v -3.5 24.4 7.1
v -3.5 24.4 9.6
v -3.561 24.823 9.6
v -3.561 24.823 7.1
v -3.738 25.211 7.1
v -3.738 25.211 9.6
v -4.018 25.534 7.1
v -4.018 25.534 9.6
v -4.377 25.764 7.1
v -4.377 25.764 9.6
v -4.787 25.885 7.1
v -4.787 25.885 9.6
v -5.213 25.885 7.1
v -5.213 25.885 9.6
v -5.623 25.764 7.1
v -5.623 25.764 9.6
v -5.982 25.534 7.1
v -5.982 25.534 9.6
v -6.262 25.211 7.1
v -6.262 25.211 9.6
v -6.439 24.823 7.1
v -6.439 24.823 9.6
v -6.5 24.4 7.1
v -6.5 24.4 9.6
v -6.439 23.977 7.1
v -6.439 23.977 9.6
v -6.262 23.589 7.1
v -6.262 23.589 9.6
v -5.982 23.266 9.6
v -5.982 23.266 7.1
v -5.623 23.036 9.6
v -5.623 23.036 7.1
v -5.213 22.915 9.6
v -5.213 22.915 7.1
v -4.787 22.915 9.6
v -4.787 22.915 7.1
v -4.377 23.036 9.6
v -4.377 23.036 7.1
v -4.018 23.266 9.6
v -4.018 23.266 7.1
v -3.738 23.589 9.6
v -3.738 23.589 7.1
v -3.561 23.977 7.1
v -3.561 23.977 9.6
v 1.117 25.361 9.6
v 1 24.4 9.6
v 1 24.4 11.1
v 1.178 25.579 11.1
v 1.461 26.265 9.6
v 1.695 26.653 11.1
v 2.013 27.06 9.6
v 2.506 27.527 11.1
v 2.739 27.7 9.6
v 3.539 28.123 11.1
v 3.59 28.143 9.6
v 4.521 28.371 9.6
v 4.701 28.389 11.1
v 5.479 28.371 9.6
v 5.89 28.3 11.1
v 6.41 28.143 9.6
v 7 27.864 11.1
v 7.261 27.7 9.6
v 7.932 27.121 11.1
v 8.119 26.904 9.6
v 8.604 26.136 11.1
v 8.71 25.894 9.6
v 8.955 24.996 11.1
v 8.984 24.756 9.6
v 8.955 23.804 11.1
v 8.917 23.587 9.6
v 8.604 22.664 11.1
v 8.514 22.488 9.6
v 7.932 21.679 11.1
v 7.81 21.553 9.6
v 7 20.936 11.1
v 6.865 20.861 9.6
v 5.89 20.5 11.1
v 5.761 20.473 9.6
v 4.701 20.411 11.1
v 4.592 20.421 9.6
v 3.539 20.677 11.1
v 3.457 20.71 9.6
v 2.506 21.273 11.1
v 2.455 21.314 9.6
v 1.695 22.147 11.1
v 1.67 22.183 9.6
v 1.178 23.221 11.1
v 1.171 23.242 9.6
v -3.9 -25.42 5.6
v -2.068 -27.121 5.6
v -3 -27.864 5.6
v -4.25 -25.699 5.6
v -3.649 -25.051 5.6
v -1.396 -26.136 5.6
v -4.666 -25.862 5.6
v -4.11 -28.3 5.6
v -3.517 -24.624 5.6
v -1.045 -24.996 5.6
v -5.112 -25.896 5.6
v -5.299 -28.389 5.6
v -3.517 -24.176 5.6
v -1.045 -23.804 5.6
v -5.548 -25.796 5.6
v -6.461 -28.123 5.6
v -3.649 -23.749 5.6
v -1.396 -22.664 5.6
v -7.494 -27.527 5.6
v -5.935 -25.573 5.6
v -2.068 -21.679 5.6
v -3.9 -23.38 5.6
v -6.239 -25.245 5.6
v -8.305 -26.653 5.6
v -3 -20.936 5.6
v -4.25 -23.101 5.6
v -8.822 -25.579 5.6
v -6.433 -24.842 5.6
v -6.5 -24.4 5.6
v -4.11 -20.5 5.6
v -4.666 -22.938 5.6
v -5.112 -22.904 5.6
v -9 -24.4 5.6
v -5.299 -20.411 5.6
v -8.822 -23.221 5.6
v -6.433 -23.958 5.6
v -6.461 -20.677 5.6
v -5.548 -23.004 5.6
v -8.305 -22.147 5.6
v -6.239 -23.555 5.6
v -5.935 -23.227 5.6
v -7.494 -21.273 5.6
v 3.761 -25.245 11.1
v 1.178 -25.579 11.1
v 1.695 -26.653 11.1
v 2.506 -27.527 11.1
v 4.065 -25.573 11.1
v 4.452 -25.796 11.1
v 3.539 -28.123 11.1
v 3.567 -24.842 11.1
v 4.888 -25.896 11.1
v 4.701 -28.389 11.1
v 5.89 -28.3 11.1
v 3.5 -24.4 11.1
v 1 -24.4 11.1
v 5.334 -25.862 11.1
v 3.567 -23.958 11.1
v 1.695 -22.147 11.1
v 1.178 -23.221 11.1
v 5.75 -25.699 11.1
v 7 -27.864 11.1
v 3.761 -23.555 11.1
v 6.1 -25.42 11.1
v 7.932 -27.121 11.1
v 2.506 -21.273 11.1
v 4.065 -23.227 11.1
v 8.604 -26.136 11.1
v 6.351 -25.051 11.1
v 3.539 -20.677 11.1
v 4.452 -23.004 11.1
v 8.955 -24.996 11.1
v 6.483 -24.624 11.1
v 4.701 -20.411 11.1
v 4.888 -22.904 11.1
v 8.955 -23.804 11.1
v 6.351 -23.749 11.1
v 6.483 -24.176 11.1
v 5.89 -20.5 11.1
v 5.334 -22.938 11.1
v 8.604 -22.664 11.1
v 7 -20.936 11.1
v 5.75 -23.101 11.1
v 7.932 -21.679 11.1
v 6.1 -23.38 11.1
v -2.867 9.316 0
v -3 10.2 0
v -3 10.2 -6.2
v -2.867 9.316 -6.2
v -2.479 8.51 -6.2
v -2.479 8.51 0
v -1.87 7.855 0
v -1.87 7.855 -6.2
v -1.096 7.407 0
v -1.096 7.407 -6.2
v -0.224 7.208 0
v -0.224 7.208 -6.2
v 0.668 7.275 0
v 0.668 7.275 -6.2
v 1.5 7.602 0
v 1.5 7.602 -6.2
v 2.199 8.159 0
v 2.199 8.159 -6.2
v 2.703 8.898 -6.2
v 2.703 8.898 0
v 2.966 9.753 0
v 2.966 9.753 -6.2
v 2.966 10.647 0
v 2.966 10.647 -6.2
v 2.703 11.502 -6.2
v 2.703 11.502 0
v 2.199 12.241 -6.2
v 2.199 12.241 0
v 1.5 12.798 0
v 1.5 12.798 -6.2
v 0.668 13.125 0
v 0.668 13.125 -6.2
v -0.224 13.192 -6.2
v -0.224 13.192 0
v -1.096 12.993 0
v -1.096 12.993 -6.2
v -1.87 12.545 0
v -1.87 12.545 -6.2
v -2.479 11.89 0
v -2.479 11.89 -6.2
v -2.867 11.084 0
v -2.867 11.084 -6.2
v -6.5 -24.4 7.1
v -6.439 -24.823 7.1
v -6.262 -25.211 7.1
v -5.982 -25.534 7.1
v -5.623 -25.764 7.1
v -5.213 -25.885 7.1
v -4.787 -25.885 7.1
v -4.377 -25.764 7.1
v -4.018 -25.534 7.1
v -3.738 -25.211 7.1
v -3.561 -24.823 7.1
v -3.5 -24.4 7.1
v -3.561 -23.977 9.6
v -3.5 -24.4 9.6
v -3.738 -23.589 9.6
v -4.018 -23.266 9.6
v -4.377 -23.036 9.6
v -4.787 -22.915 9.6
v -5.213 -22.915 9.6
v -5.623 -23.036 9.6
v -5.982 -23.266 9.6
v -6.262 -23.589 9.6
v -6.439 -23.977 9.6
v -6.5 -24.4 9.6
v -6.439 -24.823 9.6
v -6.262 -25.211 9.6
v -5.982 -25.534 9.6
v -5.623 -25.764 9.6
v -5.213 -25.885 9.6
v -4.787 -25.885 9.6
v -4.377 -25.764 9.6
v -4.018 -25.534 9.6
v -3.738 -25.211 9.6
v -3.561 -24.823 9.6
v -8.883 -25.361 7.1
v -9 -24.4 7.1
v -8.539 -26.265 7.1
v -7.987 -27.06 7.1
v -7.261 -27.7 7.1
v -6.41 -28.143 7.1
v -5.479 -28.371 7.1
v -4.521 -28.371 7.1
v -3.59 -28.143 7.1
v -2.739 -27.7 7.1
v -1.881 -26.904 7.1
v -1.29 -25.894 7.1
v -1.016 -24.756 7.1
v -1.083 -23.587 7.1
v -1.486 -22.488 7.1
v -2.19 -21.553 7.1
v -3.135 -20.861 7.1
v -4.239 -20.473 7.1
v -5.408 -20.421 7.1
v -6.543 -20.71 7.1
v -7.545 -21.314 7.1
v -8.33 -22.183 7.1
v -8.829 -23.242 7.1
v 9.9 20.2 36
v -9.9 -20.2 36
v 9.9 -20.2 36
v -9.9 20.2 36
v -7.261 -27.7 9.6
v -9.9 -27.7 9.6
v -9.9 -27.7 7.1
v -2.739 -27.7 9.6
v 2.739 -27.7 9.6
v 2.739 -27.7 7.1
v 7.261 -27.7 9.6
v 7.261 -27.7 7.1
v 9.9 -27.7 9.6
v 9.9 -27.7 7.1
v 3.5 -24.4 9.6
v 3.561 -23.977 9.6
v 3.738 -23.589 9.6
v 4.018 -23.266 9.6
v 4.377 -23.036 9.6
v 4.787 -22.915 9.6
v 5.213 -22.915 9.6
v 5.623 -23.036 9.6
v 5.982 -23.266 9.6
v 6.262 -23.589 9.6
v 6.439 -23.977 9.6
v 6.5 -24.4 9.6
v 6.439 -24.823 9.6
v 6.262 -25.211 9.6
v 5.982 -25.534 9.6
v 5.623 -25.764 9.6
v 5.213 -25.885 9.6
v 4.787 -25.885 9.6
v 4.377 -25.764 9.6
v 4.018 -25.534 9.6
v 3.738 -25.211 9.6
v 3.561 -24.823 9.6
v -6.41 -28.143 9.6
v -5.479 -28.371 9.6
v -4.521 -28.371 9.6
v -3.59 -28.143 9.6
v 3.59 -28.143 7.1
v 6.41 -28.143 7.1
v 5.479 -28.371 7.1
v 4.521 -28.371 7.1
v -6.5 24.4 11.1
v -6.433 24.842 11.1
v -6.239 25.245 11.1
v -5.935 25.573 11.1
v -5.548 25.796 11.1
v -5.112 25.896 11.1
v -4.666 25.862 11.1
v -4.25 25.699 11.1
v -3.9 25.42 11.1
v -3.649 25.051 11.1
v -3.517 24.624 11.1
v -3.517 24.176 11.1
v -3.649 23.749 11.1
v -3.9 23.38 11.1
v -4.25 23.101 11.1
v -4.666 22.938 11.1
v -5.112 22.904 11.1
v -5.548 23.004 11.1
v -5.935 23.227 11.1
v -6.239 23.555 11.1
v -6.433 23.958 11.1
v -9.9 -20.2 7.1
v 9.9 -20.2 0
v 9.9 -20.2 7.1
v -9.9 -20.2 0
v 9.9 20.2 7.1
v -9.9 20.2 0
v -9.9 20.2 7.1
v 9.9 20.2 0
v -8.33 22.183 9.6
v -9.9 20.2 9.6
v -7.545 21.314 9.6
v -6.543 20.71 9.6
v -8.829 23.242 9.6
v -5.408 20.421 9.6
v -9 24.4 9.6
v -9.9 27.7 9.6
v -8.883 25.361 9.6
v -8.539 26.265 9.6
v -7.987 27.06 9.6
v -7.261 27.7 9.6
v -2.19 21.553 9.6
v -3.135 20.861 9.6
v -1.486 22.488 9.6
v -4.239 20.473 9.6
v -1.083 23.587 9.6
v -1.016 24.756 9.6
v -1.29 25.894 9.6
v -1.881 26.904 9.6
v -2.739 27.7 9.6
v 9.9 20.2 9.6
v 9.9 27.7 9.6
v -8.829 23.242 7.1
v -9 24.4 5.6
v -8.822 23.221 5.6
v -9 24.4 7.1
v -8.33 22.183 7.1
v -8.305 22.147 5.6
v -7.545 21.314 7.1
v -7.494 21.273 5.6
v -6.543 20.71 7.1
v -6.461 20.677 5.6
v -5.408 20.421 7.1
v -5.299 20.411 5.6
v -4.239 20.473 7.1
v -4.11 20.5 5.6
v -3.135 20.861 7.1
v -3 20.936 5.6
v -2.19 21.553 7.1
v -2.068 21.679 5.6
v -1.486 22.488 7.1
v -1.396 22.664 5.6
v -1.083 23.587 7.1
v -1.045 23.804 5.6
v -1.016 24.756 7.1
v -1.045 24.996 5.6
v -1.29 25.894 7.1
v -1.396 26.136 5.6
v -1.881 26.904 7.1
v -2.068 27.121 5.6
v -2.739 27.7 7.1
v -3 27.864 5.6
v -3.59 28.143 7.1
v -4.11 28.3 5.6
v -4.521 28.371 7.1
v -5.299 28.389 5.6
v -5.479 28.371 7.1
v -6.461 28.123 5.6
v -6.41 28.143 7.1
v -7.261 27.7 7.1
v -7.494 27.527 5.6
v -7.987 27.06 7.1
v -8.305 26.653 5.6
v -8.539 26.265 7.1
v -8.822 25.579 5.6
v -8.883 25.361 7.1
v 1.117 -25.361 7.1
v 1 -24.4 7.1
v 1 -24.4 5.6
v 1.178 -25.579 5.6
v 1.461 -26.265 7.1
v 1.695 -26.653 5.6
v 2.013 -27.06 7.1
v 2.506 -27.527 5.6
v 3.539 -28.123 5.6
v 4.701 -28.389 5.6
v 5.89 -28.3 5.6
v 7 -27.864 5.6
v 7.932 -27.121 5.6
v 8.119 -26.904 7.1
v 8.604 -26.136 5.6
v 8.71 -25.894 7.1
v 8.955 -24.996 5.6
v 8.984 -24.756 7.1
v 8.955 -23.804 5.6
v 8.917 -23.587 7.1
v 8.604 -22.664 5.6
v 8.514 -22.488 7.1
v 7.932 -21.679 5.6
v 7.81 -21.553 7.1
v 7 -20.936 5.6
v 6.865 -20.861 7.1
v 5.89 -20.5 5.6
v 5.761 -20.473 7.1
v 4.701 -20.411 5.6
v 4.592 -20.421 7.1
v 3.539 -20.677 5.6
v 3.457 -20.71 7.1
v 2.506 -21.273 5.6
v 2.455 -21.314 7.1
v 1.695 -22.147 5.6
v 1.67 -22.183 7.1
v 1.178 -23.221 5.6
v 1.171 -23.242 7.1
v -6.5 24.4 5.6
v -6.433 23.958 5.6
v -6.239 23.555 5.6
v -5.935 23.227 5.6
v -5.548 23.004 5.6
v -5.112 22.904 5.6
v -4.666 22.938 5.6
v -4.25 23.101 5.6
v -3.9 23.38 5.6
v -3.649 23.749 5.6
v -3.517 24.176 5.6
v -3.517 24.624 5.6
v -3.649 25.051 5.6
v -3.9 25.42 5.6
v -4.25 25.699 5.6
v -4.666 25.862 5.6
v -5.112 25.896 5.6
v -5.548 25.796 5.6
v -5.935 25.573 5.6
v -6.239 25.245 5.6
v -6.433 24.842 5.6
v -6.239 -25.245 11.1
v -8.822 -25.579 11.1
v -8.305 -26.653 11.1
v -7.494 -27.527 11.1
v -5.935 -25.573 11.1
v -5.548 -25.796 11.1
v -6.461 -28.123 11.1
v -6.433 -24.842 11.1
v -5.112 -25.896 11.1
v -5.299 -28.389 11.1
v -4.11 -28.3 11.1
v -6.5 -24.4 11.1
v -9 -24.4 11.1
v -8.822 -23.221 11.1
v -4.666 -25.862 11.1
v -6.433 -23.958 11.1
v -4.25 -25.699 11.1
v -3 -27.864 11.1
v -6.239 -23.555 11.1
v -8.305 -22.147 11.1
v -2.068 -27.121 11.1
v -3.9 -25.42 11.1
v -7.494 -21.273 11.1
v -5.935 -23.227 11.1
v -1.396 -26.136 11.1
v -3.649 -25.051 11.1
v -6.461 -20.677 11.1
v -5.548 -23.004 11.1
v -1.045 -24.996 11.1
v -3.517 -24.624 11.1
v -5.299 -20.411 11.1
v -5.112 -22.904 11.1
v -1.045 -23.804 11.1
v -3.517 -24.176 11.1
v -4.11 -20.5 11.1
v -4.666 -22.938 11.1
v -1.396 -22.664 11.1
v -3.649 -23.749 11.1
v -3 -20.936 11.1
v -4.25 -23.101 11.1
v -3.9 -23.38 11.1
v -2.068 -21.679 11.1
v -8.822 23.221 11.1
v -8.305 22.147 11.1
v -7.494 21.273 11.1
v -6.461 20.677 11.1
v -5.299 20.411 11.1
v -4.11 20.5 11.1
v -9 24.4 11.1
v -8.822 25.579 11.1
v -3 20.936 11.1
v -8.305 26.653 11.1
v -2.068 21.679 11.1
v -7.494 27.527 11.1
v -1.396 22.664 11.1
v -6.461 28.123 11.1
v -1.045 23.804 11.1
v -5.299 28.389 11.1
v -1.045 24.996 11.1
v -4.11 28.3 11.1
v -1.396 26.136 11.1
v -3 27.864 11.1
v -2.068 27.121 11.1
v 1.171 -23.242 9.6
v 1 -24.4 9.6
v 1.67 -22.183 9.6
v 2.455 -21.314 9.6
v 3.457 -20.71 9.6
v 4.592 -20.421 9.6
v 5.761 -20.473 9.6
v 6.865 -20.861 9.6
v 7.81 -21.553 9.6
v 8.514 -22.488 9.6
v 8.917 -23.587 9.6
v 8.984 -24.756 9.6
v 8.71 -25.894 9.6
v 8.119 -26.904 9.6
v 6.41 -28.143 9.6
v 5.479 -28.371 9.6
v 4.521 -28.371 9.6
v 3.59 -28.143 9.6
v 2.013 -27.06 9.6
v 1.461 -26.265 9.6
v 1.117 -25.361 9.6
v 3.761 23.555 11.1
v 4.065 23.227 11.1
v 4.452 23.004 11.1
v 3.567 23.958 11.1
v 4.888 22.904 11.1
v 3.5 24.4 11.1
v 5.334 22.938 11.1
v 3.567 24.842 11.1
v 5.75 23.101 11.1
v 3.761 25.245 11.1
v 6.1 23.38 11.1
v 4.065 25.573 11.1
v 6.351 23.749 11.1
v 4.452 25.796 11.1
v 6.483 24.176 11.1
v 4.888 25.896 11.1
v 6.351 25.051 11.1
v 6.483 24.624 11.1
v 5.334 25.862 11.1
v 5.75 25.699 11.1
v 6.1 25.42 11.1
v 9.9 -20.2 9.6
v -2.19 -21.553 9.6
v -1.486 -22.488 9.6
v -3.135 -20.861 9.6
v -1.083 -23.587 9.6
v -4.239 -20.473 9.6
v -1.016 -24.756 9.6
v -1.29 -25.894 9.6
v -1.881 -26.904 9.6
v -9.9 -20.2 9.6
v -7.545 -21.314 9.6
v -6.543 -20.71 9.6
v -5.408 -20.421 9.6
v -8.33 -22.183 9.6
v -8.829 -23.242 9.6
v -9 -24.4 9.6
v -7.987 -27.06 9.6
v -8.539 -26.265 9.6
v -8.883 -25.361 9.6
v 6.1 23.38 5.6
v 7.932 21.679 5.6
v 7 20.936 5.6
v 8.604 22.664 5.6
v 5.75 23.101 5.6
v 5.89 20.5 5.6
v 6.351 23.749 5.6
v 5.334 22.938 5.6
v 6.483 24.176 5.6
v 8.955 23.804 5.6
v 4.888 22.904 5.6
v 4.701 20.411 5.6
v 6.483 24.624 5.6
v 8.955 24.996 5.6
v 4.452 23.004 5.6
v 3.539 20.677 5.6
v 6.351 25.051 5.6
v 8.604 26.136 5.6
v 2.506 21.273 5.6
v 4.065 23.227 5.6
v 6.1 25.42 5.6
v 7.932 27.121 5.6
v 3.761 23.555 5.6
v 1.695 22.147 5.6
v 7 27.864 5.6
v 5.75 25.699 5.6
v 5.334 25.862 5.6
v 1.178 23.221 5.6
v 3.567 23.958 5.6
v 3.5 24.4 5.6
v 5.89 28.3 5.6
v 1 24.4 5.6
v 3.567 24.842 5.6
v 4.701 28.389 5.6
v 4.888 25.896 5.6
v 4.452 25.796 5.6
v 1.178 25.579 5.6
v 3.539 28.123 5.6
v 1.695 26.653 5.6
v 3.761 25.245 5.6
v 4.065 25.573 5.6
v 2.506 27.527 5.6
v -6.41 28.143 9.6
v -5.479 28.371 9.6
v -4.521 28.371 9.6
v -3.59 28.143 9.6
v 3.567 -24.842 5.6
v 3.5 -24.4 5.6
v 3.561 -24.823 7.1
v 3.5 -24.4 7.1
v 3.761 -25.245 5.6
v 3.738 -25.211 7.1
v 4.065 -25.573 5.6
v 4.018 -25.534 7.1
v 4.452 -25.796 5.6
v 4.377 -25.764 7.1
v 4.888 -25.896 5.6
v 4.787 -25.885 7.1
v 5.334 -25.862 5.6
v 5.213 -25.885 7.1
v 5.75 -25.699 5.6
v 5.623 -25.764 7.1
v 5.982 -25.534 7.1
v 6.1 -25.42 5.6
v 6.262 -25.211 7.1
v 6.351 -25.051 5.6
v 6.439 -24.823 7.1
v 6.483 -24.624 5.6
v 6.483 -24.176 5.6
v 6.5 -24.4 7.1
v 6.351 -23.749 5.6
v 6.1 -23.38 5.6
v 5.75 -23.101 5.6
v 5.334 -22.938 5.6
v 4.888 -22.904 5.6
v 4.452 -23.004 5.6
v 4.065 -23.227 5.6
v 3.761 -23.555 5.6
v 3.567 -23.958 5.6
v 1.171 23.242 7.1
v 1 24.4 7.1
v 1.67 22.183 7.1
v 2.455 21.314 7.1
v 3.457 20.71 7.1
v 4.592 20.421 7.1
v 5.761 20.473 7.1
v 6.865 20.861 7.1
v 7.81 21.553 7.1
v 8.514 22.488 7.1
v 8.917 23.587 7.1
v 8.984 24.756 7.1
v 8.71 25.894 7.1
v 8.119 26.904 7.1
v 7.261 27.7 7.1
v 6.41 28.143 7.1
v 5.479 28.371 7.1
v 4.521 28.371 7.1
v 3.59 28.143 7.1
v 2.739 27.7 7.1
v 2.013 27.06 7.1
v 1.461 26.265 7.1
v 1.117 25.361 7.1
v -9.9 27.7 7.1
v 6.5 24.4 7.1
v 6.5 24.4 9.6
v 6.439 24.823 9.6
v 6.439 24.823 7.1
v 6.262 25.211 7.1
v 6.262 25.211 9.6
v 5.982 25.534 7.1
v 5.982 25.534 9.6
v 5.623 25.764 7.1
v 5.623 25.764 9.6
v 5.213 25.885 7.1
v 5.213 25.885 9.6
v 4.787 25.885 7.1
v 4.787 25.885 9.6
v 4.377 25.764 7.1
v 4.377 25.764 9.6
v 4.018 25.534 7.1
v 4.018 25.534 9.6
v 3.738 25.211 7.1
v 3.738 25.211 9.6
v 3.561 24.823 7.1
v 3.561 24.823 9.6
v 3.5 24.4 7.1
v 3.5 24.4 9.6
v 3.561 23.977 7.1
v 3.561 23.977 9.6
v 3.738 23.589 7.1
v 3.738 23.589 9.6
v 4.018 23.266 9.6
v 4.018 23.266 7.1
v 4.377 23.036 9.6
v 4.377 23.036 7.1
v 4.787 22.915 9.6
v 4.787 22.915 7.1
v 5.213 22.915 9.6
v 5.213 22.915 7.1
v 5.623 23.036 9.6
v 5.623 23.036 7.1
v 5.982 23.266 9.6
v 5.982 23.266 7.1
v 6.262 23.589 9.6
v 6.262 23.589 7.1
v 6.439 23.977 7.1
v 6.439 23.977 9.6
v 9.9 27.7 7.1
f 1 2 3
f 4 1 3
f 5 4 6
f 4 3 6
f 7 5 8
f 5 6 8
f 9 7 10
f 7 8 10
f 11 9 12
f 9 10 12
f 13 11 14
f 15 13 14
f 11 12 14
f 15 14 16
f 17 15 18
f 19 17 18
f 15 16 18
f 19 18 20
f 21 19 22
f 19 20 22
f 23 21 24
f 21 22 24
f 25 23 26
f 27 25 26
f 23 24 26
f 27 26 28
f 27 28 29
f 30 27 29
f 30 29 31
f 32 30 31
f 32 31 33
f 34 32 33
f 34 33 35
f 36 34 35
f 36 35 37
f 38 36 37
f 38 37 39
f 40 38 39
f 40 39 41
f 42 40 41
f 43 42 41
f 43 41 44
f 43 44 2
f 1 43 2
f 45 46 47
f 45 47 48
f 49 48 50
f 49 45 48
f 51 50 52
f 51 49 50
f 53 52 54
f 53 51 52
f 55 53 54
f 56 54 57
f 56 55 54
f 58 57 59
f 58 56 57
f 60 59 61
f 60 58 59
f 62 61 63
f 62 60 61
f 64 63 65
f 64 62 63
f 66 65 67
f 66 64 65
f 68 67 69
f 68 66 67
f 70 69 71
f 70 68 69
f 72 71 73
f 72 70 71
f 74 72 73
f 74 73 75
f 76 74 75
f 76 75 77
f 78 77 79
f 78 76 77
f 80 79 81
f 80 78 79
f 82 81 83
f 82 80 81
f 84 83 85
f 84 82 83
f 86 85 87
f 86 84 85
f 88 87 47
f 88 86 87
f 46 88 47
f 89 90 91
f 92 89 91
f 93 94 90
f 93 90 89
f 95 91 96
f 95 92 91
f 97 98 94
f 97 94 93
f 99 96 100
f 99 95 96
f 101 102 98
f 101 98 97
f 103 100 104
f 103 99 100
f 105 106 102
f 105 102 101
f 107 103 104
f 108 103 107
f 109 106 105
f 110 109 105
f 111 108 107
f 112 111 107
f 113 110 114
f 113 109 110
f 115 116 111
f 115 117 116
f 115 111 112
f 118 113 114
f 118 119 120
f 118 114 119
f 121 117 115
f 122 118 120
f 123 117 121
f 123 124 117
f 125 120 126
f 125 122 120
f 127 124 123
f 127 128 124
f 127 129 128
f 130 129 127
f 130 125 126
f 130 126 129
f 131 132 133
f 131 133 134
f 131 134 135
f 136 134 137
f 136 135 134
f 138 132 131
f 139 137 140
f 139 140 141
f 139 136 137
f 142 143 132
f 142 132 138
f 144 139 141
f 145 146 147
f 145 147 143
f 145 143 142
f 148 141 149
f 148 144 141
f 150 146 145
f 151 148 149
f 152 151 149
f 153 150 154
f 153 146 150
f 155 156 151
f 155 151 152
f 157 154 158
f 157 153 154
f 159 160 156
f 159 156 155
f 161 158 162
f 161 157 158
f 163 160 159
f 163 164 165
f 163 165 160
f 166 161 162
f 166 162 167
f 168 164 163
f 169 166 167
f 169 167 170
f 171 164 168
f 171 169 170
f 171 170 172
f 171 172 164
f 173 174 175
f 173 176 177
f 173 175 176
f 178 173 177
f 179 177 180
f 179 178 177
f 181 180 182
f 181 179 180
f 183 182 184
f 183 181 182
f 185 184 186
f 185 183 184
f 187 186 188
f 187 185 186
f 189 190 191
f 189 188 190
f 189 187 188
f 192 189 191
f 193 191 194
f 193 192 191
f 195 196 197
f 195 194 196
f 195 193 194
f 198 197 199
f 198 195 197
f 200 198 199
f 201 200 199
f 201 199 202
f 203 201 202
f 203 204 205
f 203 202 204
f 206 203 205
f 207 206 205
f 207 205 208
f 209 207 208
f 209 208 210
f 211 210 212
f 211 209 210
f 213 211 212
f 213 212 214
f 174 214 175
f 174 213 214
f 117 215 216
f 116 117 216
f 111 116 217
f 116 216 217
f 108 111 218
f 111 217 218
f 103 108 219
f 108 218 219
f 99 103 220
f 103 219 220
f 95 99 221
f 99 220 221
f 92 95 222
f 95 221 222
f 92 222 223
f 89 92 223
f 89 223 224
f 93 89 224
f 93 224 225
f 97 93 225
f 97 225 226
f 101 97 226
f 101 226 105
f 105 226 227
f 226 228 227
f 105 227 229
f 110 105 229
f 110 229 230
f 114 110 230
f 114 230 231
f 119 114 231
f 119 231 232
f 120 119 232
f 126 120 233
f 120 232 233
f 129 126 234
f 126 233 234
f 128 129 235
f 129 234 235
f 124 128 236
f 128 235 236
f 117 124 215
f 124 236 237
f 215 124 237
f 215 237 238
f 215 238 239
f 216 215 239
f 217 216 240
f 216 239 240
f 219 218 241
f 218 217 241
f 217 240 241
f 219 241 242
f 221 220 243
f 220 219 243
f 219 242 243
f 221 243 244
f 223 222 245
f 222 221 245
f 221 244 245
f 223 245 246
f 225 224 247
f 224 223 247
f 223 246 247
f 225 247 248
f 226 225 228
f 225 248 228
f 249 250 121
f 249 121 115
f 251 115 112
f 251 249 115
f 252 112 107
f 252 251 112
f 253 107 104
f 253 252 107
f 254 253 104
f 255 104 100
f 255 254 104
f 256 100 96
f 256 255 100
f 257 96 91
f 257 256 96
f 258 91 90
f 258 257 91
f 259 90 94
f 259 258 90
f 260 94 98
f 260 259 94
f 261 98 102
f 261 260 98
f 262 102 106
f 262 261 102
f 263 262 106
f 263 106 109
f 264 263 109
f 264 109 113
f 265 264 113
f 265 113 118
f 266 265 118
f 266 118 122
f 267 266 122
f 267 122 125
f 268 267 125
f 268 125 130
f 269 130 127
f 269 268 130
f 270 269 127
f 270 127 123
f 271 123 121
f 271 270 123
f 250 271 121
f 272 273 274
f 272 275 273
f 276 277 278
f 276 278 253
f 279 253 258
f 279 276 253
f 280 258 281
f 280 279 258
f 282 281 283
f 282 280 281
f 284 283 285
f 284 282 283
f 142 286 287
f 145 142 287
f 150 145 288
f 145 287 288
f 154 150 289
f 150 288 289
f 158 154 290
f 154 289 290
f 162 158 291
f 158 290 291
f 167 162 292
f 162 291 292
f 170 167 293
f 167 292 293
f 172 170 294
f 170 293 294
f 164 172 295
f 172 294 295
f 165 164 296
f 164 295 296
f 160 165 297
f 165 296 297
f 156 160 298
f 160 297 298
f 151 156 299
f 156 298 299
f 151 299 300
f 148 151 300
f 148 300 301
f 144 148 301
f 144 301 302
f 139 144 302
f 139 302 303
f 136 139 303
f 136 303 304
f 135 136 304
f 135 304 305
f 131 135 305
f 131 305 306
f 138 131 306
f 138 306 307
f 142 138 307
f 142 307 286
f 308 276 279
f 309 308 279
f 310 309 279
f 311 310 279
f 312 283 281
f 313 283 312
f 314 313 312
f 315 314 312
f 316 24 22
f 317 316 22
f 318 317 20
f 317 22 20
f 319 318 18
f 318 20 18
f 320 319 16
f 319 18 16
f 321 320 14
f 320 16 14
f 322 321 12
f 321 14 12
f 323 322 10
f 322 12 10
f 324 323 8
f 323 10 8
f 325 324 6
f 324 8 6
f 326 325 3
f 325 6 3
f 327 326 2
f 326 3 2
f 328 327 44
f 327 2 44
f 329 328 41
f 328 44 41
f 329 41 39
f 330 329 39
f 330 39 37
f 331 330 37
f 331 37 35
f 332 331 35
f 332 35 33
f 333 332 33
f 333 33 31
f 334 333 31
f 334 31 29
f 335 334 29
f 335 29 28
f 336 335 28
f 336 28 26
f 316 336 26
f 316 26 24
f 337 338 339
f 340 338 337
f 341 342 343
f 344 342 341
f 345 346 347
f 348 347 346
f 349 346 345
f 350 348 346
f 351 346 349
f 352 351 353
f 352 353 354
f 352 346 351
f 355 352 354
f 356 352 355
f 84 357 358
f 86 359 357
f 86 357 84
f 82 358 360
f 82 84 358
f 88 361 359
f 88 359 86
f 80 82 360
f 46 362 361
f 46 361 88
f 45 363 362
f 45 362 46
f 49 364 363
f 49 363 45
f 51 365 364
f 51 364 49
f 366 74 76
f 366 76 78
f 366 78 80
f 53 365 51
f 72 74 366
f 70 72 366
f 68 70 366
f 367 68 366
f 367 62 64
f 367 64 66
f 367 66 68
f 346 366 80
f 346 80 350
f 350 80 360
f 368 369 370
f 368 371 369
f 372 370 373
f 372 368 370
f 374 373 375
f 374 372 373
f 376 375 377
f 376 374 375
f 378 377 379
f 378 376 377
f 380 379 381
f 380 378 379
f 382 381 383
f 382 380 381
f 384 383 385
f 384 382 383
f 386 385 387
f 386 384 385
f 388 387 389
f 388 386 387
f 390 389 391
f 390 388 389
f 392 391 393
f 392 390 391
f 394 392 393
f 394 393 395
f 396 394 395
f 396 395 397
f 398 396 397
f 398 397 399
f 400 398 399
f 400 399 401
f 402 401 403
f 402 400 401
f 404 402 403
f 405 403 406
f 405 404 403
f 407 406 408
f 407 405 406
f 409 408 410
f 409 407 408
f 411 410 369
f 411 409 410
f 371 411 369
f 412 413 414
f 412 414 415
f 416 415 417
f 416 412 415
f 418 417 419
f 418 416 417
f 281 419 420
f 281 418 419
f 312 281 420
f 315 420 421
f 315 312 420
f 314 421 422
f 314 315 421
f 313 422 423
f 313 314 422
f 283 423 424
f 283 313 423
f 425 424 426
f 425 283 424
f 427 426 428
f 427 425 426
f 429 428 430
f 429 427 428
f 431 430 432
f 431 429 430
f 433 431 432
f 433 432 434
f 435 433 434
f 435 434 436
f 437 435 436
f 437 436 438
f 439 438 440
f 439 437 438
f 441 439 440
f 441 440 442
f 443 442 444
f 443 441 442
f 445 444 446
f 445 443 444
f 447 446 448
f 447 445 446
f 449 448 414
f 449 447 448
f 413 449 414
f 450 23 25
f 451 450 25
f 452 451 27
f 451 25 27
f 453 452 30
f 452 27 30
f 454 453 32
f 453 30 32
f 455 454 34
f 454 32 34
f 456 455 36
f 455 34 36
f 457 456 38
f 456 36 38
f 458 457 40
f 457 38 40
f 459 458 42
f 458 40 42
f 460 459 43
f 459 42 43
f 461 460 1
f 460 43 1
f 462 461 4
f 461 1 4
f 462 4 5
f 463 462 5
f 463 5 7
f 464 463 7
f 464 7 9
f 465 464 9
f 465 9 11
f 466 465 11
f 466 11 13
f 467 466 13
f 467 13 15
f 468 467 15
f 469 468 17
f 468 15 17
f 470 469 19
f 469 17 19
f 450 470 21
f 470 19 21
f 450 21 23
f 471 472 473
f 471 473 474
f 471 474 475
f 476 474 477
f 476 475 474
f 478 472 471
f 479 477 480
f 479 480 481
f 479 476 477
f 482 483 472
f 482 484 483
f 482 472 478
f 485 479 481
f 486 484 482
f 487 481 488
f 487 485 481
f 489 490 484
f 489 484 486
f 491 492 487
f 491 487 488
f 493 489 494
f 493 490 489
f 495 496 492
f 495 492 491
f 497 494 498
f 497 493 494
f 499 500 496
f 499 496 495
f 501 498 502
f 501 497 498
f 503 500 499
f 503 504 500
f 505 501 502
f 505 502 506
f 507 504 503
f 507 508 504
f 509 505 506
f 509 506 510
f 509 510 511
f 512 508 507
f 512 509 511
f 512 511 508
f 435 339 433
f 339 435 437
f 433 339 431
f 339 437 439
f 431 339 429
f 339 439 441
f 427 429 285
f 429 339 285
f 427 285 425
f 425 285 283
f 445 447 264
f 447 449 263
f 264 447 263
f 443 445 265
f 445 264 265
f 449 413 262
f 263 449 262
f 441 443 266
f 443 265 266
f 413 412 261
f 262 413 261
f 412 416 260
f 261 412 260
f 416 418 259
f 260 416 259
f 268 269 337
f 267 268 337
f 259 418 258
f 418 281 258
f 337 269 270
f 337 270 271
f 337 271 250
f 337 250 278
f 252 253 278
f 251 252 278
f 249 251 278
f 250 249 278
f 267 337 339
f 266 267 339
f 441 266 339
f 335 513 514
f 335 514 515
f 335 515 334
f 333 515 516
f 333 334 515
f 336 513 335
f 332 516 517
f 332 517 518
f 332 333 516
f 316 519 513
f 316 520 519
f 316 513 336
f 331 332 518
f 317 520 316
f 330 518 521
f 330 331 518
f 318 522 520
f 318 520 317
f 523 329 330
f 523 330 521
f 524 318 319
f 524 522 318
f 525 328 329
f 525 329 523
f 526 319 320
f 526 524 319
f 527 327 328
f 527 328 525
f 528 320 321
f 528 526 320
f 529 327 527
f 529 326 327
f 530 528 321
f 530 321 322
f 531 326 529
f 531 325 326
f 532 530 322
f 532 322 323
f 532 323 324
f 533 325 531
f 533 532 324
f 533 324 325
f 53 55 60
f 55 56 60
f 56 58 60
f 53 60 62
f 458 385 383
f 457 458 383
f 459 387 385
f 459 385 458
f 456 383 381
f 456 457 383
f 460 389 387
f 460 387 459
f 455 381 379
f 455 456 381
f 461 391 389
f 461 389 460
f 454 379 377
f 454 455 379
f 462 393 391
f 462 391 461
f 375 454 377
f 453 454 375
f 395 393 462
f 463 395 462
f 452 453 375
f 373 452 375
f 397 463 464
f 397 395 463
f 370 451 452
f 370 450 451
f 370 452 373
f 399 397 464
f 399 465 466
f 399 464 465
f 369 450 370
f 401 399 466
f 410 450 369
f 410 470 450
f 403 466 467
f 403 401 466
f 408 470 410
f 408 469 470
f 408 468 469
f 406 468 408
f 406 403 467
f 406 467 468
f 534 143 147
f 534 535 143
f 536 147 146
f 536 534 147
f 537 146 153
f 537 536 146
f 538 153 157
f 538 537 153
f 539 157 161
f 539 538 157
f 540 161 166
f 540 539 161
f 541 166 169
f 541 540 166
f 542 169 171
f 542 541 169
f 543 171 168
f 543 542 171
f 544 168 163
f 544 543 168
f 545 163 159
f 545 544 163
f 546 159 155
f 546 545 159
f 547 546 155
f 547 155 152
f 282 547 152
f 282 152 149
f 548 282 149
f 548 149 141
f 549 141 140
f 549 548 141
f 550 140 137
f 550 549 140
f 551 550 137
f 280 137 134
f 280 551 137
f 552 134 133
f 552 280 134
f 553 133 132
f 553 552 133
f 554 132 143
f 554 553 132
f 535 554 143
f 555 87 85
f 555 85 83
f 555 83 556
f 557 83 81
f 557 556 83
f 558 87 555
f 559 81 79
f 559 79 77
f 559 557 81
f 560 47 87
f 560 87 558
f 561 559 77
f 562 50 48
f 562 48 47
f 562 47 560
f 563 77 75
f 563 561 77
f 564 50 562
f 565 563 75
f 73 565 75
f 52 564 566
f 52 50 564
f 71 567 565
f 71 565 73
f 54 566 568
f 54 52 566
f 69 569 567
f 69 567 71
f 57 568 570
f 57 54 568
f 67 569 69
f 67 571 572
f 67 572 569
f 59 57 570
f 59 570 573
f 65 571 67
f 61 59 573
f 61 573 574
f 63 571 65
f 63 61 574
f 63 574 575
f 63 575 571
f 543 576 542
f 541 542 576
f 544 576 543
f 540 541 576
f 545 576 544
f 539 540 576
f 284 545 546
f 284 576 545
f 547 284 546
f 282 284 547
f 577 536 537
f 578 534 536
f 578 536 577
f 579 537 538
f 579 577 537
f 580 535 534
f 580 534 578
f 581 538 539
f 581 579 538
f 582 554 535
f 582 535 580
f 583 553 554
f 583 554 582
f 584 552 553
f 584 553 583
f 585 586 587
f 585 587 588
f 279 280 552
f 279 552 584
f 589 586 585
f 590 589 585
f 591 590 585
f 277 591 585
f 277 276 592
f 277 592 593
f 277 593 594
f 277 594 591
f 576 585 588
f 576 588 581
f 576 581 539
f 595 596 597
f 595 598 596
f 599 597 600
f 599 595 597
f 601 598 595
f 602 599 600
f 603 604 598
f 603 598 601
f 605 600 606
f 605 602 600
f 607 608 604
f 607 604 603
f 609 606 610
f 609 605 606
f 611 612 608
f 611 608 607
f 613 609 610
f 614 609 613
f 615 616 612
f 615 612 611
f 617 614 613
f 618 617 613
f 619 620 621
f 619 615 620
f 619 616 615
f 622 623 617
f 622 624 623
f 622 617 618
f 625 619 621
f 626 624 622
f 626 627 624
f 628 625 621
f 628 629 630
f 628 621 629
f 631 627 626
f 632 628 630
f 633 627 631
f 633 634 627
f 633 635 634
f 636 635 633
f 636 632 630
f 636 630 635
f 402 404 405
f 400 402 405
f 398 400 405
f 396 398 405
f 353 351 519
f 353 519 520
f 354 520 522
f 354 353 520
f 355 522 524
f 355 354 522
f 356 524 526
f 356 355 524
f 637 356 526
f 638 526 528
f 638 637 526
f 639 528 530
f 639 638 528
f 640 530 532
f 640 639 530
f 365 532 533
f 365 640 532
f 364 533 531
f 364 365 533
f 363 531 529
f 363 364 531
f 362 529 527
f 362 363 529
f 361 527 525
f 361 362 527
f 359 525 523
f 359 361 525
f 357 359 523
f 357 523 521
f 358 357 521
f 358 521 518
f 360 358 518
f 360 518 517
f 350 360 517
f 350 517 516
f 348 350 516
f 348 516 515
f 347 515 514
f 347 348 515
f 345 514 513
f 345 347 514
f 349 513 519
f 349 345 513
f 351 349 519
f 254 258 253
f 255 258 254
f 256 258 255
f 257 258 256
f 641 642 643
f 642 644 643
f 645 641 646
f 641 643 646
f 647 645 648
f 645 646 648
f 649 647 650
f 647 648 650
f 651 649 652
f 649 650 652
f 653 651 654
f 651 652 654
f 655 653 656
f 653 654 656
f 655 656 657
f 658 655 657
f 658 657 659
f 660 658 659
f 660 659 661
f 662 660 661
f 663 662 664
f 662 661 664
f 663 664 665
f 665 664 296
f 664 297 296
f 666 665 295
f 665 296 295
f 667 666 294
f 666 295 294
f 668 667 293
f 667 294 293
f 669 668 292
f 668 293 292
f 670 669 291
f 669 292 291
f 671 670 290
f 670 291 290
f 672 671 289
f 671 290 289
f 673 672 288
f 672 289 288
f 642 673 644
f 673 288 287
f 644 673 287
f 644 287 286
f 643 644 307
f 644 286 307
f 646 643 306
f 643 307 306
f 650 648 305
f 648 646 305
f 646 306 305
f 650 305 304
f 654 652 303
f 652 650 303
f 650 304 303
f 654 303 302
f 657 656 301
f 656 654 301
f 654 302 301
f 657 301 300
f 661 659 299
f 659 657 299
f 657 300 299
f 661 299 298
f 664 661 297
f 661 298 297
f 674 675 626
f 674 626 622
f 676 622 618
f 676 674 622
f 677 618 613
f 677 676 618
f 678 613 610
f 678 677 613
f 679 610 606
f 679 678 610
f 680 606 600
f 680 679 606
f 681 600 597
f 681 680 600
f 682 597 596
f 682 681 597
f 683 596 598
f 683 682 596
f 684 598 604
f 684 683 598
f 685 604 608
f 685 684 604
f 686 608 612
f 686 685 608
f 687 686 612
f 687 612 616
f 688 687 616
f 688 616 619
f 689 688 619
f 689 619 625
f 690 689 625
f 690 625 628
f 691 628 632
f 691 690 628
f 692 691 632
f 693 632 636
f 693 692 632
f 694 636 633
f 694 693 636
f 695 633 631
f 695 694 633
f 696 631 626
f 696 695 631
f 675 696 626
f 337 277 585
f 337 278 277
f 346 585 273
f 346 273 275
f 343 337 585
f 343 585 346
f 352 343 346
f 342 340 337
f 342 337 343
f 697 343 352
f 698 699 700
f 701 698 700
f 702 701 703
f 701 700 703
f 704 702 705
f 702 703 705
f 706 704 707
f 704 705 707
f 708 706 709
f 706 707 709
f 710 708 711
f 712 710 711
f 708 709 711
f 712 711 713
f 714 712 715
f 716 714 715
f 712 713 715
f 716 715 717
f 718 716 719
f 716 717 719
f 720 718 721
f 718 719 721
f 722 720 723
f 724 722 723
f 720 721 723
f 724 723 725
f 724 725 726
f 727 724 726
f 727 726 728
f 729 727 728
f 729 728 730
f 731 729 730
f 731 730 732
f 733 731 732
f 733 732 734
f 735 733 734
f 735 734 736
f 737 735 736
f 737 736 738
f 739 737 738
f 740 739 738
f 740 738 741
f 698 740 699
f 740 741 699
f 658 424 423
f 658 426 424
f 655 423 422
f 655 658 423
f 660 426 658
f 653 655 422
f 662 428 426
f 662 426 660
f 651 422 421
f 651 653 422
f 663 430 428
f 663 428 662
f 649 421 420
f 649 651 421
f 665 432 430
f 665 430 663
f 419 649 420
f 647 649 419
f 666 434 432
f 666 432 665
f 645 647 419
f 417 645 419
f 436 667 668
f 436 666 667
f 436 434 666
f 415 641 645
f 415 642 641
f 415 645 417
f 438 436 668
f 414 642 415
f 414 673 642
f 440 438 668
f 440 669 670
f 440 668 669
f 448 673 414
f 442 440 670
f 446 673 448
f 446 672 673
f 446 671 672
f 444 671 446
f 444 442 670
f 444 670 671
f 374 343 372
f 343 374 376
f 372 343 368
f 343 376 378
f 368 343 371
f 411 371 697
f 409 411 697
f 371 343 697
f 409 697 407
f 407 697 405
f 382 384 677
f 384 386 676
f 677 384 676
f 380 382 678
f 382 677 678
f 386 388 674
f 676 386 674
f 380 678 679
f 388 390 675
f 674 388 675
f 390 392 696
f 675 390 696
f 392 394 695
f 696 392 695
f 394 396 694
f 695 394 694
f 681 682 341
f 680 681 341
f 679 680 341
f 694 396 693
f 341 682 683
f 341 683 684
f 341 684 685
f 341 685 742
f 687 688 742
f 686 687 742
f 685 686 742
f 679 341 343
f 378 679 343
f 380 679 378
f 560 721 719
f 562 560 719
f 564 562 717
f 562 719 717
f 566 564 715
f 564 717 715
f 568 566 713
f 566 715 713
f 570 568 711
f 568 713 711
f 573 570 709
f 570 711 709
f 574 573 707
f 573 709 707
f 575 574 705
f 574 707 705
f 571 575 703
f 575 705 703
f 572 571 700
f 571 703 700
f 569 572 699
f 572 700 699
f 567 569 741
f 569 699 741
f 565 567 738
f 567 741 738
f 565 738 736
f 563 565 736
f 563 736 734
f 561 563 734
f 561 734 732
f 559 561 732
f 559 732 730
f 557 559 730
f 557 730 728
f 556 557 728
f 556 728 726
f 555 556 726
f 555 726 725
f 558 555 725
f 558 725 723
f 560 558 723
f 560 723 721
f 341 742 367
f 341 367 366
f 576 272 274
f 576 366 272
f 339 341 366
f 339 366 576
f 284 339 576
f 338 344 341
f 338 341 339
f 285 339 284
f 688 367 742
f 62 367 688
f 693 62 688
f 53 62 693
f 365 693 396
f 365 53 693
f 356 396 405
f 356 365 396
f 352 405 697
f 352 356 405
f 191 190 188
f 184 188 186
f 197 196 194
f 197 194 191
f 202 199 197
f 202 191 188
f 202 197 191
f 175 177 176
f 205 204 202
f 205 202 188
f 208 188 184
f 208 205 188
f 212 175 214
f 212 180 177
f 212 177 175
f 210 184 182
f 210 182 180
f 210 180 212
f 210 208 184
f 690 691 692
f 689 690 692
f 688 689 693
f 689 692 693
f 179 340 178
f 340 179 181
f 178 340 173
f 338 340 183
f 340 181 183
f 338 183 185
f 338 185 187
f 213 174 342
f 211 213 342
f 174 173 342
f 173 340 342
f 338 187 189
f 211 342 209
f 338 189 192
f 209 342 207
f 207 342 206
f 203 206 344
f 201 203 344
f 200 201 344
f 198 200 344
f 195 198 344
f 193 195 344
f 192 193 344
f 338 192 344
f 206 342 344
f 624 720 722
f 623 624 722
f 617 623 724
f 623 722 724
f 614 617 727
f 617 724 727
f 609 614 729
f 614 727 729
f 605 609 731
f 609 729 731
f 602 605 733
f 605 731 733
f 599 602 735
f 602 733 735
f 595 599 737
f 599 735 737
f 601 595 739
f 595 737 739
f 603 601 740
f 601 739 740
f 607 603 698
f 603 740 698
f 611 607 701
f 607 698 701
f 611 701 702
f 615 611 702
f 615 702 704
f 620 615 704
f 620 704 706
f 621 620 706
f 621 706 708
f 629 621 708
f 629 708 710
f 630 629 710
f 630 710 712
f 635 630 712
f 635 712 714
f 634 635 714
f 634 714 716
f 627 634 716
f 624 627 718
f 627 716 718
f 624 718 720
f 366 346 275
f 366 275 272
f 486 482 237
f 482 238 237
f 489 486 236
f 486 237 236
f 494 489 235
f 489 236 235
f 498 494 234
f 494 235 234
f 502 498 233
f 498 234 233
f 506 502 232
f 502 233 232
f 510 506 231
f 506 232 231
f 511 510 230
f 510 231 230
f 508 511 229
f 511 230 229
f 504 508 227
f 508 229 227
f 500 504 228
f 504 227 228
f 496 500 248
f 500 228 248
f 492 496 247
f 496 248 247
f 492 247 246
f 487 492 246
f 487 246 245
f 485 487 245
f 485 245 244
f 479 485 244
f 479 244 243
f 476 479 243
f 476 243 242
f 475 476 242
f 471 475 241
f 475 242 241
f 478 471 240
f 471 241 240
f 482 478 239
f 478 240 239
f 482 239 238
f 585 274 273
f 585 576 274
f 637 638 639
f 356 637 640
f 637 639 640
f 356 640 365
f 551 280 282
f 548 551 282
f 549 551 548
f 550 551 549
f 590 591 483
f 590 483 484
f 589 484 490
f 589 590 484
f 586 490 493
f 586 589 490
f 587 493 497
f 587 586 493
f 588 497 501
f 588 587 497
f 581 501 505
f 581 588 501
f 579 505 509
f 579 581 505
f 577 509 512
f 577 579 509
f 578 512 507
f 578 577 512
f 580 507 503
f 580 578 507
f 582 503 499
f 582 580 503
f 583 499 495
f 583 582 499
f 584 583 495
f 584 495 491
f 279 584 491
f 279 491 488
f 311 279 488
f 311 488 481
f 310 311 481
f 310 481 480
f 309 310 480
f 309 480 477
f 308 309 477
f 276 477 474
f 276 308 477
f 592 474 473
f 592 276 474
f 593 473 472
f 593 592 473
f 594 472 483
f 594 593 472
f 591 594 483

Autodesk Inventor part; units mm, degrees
sketch "スケッチ1" plane through (0, 0, 0) normal (0, 0, 1) x (1, 0, 0)
  line L0 (9.9, -20.2) -> (-9.9, -20.2)
  line L1 (-9.9, -20.2) -> (-9.9, 20.2)
  line L2 (-9.9, 20.2) -> (9.9, 20.2)
  line L3 (9.9, 20.2) -> (9.9, -20.2)
  line L4 (9.9, -20.2) -> (-9.9, 20.2) construction
  line L5 (-9.9, -20.2) -> (9.9, 20.2) construction
  circle A0 centre (-10.932, 25.3443) radius 2.25
  point P0 (0, 0)
  dimension "d0" = 4.5
  dimension "d1" = 40.4
  dimension "d2" = 19.8
extrude "押し出し1" add sketch "スケッチ1" along normal blind 36 contours L0 L1 L2 L3
sketch "スケッチ2" plane through (0, 0, 0) normal (0, 0, -1) x (-1, 0, 0)
  circle A0 centre (0, 10.2) radius 3
  line L0 (9.9, 20.2) -> (-9.9, 20.2) projected
  point P0 (0, 0)
  dimension "d5" = 6
  dimension "d6" = 10
extrude "押し出し2" add sketch "スケッチ2" along normal blind 6.2
ref_plane "作業平面1" through (0, 0, 9.6) normal (0, 0, 1) x (1, 0, 0)
sketch "スケッチ4" plane through (0, 0, 9.6) normal (0, 0, 1) x (1, 0, 0)
  line L0 (-9.9, -20.2) -> (9.9, -20.2) projected
  line L1 (9.9, -20.2) -> (9.9, 20.2) projected
  line L2 (9.9, 20.2) -> (-9.9, 20.2) projected
  line L3 (-9.9, 20.2) -> (-9.9, -20.2) projected
  line L4 (-9.9, 20.2) -> (9.9, 20.2)
  line L5 (9.9, 20.2) -> (9.9, 27.7)
  line L6 (9.9, 27.7) -> (-9.9, 27.7)
  line L7 (-9.9, 27.7) -> (-9.9, 20.2)
  line L8 (-9.9, -20.2) -> (9.9, -20.2)
  line L9 (9.9, -20.2) -> (9.9, -27.7)
  line L10 (9.9, -27.7) -> (-9.9, -27.7)
  line L11 (-9.9, -27.7) -> (-9.9, -20.2)
  circle A0 centre (-5, 24.4) radius 1.5
  circle A1 centre (5, 24.4) radius 1.5
  line L12 (0, 27.7) -> (0, 20.2)
  point P0 (0, 0)
  dimension "d10" = 7.5
  dimension "d11" = 7.5
  dimension "d12" = 3
  dimension "d13" = 4.2
  dimension "d15" = 10
  dimension "d16" = 5
  dimension "d17" = 4.2
extrude "押し出し3" add sketch "スケッチ4" against normal blind 2.5 contours L7 L6 L12 L2 | L2 L12 L6 L5
ref_plane "作業平面2" through (-9.9, 0, 36) normal (0, 1, 0) x (1, 0, 0)
mirror "ミラー1" about plane through (-9.9, 0, 36) normal (0, 1, 0) of "押し出し3"
sketch "スケッチ5" plane through (0, 0, 7.1) normal (0, 0, -1) x (-1, 0, 0)
  circle A0 centre (5, 24.4) radius 1.5 projected
  circle A1 centre (-5, 24.4) radius 1.5 projected
  line L0 (9.9, 20.2) -> (-9.9, 20.2) projected
  line L1 (9.9, 20.2) -> (9.9, 27.7) projected
  line L2 (9.9, 27.7) -> (-9.9, 27.7) projected
  line L3 (-9.9, 27.7) -> (-9.9, 20.2) projected
  circle A2 centre (5, -24.4) radius 1.5 projected
  circle A3 centre (-5, -24.4) radius 1.5 projected
  line L4 (-9.9, -20.2) -> (9.9, -20.2) projected
  line L5 (-9.9, -27.7) -> (-9.9, -20.2) projected
  line L6 (9.9, -27.7) -> (-9.9, -27.7) projected
  line L7 (9.9, -20.2) -> (9.9, -27.7) projected
  circle A4 centre (-5, 24.4) radius 4
  circle A5 centre (5, 24.4) radius 4
  circle A6 centre (-5, -24.4) radius 4
  circle A7 centre (5, -24.4) radius 4
  point P0 (0, 0)
  dimension "d20" = 8
  dimension "d21" = 8
  dimension "d22" = 8
  dimension "d23" = 8
extrude "押し出し4" add sketch "スケッチ5" along normal blind 1.5 contours A5 L2 | L2 A5 | A4 L2 | L2 A4 | A6 L6 | L6 A6 | A7 L6 | L6 A7
ref_plane "作業平面3" through (0, 0, 8.35) normal (0, 0, -1) x (-1, 0, 0)
mirror "ミラー2" about plane through (0, 0, 8.35) normal (0, 0, -1) of "押し出し4"
ref_plane "作業平面4" through (0, -20.2, 0) normal (-1, 0, 0) x (0, 0, 1)
equation "\"d16\" = 0.5 * d15"
equation "\"d17\" = d13"
